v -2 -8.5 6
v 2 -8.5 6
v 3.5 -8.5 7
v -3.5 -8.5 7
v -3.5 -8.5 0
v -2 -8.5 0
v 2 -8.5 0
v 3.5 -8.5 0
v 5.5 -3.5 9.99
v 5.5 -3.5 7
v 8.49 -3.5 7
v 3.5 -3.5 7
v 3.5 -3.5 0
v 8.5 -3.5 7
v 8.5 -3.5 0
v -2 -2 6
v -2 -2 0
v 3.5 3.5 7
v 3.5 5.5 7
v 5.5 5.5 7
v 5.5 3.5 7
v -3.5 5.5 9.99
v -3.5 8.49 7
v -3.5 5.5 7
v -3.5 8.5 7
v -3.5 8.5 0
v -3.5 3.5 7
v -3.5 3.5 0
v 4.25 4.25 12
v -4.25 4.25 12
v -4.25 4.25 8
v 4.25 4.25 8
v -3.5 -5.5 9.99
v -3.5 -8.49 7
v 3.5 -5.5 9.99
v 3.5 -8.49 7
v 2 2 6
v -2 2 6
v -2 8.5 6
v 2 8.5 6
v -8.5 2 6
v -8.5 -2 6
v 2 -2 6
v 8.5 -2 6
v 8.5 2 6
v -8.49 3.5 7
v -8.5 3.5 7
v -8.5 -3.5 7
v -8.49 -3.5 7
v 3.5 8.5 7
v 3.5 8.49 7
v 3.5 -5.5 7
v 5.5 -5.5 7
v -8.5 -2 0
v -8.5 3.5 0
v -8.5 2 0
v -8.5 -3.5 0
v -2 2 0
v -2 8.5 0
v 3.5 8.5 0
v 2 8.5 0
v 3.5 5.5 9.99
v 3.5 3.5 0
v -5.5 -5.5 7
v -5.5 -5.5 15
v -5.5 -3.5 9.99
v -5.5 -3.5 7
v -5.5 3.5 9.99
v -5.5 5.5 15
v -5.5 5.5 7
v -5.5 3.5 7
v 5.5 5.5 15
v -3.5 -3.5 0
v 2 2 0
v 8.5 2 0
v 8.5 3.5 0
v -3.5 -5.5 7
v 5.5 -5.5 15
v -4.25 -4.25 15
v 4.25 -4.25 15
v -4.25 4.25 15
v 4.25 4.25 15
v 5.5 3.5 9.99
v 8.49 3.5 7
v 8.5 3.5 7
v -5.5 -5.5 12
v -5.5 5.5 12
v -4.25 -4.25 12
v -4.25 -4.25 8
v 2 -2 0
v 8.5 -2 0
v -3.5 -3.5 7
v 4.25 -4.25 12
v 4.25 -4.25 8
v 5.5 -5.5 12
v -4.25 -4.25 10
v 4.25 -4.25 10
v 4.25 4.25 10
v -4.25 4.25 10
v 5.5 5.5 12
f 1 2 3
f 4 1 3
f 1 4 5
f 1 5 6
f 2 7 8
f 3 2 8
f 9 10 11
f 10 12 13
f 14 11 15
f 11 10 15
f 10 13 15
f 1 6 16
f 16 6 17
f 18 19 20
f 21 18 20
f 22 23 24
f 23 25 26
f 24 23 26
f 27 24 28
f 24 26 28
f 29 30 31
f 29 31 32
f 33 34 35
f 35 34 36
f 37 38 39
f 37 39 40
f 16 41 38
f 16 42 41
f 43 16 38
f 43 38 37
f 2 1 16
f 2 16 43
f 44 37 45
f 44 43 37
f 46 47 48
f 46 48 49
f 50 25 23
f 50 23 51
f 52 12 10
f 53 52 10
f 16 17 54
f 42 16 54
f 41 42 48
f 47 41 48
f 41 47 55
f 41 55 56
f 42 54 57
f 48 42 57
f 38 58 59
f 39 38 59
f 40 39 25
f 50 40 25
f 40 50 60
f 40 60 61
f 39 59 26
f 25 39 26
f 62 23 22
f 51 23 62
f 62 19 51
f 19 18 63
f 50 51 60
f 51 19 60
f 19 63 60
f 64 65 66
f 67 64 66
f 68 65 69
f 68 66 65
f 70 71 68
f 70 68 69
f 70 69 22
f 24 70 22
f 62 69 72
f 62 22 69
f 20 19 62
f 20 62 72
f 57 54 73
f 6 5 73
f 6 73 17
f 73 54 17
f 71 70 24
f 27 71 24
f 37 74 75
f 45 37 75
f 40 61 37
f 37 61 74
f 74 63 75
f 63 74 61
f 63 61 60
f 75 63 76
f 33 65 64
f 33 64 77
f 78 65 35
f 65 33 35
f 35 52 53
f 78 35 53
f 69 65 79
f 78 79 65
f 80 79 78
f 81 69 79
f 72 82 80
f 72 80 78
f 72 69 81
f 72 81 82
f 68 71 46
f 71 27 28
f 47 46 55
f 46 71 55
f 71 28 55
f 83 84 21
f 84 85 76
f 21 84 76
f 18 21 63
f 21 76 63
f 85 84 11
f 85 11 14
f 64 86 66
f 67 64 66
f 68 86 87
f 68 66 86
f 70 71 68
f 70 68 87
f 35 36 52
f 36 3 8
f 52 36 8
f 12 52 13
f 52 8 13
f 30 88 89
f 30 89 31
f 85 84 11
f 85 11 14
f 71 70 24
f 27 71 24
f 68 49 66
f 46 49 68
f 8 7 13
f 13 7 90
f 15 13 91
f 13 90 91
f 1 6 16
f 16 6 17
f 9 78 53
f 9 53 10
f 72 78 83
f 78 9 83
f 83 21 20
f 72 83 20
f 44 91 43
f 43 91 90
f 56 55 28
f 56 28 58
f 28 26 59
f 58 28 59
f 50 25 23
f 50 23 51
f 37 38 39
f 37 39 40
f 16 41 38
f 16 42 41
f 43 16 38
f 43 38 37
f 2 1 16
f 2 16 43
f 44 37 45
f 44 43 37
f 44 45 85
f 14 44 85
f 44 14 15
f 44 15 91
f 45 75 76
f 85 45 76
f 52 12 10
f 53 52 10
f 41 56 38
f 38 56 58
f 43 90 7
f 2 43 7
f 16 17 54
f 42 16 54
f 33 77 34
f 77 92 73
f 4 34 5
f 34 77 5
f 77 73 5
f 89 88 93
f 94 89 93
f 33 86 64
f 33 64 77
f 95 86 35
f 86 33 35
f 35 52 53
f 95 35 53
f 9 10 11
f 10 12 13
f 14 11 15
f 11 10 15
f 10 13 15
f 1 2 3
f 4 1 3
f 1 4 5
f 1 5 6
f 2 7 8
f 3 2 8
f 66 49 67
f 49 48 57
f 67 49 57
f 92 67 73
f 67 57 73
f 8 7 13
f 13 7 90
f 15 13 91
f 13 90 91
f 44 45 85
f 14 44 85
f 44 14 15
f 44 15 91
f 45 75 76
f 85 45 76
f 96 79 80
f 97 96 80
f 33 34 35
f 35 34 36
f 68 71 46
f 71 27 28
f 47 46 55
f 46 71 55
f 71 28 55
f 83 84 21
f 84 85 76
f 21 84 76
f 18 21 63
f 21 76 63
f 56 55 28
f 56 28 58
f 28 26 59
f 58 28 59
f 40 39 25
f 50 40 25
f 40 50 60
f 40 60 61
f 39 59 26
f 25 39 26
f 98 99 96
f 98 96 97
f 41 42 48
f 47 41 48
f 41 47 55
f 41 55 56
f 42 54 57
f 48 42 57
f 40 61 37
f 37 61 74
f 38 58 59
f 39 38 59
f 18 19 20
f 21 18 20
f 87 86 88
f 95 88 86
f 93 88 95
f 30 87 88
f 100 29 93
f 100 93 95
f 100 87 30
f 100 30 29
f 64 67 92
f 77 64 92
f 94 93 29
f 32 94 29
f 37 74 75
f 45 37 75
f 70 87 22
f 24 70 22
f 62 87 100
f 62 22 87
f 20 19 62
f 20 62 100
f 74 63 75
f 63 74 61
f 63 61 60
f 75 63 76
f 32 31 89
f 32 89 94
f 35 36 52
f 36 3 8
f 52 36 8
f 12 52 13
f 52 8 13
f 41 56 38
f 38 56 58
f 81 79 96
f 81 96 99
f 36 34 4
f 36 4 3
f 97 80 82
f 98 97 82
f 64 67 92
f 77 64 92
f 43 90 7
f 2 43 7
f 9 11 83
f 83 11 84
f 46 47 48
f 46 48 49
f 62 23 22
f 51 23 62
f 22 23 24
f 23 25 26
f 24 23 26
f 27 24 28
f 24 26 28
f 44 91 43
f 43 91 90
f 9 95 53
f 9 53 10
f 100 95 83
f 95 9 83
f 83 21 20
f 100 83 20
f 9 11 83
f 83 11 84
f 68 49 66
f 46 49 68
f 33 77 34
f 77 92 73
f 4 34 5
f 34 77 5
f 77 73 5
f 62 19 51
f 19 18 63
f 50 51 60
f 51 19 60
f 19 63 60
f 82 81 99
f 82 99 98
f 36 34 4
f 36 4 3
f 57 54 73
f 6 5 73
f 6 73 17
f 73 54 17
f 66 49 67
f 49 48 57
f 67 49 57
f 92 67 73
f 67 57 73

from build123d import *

# Parameters (mm, degrees)
PAD_DEPTH       = 7
POCKET_DEPTH    = 6
SKETCH002_W     = 11
SKETCH002_H     = 11
PAD001_DEPTH    = 5
SKETCH003_W     = 8.5
SKETCH003_H     = 8.5
POCKET001_DEPTH = 4
CHAMFER_SIZE    = 2.99
PAD002_DEPTH    = 7
POCKET002_DEPTH = 6
SKETCH006_W     = 11
SKETCH006_H     = 11
PAD003_DEPTH    = 8
SKETCH007_W     = 8.5
SKETCH007_H     = 8.5
POCKET003_DEPTH = 5
CHAMFER001_SIZE = 2.99


with BuildPart() as whitepart:
    # Sketch → Pad (new body)
    with BuildSketch(Plane.XY):
        Polygon((-8.5, 3.5), (-8.5, -3.5), (-3.5, -3.5), (-3.5, -8.5), (3.5, -8.5), (3.5, -3.5), (8.5, -3.5), (8.5, 3.5), (3.5, 3.5), (3.5, 8.5), (-3.5, 8.5), (-3.5, 3.5), align=None)
    extrude(amount=PAD_DEPTH)

    # Sketch001 (on Face13 of Pad) → Pocket (cut)
    with BuildSketch(Plane(origin=(0, 0, 0), x_dir=(1, 0, 0), z_dir=(0, 0, -1))):
        Polygon((-8.5, -2), (-2, -2), (-2, -8.5), (2, -8.5), (2, -2), (8.5, -2), (8.5, 2), (2, 2), (2, 8.5), (-2, 8.5), (-2, 2), (-8.5, 2), align=None)
    extrude(amount=-POCKET_DEPTH, mode=Mode.SUBTRACT)

    # Sketch002 (on Face8 of Pocket) → Pad001 (join)
    with BuildSketch(Plane.XY.offset(7)):
        Rectangle(SKETCH002_W, SKETCH002_H)
    extrude(amount=PAD001_DEPTH)

    # Sketch003 (on Face35 of Pad001) → Pocket001 (cut)
    with BuildSketch(Plane.XY.offset(12)):
        Rectangle(SKETCH003_W, SKETCH003_H)
    extrude(amount=-POCKET001_DEPTH, mode=Mode.SUBTRACT)

    # Chamfer
    chamfer_edges = [whitepart.edges().sort_by_distance(p)[0] for p in [
        (5.5, 0, 7),
        (0, -5.5, 7),
        (0, 5.5, 7),
        (-5.5, 0, 7),
    ]]
    chamfer(chamfer_edges, length=CHAMFER_SIZE)


with BuildPart() as greenpart:
    # Sketch004 → Pad002 (new body)
    with BuildSketch(Plane.XY):
        Polygon((-8.5, 3.5), (-8.5, -3.5), (-3.5, -3.5), (-3.5, -8.5), (3.5, -8.5), (3.5, -3.5), (8.5, -3.5), (8.5, 3.5), (3.5, 3.5), (3.5, 8.5), (-3.5, 8.5), (-3.5, 3.5), align=None)
    extrude(amount=PAD002_DEPTH)

    # Sketch005 (on Face13 of Pad002) → Pocket002 (cut)
    with BuildSketch(Plane(origin=(0, 0, 0), x_dir=(1, 0, 0), z_dir=(0, 0, -1))):
        Polygon((-8.5, -2), (-2, -2), (-2, -8.5), (2, -8.5), (2, -2), (8.5, -2), (8.5, 2), (2, 2), (2, 8.5), (-2, 8.5), (-2, 2), (-8.5, 2), align=None)
    extrude(amount=-POCKET002_DEPTH, mode=Mode.SUBTRACT)

    # Sketch006 (on Face8 of Pocket002) → Pad003 (join)
    with BuildSketch(Plane.XY.offset(7)):
        Rectangle(SKETCH006_W, SKETCH006_H)
    extrude(amount=PAD003_DEPTH)

    # Sketch007 (on Face35 of Pad003) → Pocket003 (cut)
    with BuildSketch(Plane.XY.offset(15)):
        Rectangle(SKETCH007_W, SKETCH007_H)
    extrude(amount=-POCKET003_DEPTH, mode=Mode.SUBTRACT)

    # Chamfer001
    chamfer001_edges = [greenpart.edges().sort_by_distance(p)[0] for p in [
        (5.5, 0, 7),
        (0, -5.5, 7),
        (0, 5.5, 7),
        (-5.5, 0, 7),
    ]]
    chamfer(chamfer001_edges, length=CHAMFER001_SIZE)


solid = Compound([whitepart.part, greenpart.part])
